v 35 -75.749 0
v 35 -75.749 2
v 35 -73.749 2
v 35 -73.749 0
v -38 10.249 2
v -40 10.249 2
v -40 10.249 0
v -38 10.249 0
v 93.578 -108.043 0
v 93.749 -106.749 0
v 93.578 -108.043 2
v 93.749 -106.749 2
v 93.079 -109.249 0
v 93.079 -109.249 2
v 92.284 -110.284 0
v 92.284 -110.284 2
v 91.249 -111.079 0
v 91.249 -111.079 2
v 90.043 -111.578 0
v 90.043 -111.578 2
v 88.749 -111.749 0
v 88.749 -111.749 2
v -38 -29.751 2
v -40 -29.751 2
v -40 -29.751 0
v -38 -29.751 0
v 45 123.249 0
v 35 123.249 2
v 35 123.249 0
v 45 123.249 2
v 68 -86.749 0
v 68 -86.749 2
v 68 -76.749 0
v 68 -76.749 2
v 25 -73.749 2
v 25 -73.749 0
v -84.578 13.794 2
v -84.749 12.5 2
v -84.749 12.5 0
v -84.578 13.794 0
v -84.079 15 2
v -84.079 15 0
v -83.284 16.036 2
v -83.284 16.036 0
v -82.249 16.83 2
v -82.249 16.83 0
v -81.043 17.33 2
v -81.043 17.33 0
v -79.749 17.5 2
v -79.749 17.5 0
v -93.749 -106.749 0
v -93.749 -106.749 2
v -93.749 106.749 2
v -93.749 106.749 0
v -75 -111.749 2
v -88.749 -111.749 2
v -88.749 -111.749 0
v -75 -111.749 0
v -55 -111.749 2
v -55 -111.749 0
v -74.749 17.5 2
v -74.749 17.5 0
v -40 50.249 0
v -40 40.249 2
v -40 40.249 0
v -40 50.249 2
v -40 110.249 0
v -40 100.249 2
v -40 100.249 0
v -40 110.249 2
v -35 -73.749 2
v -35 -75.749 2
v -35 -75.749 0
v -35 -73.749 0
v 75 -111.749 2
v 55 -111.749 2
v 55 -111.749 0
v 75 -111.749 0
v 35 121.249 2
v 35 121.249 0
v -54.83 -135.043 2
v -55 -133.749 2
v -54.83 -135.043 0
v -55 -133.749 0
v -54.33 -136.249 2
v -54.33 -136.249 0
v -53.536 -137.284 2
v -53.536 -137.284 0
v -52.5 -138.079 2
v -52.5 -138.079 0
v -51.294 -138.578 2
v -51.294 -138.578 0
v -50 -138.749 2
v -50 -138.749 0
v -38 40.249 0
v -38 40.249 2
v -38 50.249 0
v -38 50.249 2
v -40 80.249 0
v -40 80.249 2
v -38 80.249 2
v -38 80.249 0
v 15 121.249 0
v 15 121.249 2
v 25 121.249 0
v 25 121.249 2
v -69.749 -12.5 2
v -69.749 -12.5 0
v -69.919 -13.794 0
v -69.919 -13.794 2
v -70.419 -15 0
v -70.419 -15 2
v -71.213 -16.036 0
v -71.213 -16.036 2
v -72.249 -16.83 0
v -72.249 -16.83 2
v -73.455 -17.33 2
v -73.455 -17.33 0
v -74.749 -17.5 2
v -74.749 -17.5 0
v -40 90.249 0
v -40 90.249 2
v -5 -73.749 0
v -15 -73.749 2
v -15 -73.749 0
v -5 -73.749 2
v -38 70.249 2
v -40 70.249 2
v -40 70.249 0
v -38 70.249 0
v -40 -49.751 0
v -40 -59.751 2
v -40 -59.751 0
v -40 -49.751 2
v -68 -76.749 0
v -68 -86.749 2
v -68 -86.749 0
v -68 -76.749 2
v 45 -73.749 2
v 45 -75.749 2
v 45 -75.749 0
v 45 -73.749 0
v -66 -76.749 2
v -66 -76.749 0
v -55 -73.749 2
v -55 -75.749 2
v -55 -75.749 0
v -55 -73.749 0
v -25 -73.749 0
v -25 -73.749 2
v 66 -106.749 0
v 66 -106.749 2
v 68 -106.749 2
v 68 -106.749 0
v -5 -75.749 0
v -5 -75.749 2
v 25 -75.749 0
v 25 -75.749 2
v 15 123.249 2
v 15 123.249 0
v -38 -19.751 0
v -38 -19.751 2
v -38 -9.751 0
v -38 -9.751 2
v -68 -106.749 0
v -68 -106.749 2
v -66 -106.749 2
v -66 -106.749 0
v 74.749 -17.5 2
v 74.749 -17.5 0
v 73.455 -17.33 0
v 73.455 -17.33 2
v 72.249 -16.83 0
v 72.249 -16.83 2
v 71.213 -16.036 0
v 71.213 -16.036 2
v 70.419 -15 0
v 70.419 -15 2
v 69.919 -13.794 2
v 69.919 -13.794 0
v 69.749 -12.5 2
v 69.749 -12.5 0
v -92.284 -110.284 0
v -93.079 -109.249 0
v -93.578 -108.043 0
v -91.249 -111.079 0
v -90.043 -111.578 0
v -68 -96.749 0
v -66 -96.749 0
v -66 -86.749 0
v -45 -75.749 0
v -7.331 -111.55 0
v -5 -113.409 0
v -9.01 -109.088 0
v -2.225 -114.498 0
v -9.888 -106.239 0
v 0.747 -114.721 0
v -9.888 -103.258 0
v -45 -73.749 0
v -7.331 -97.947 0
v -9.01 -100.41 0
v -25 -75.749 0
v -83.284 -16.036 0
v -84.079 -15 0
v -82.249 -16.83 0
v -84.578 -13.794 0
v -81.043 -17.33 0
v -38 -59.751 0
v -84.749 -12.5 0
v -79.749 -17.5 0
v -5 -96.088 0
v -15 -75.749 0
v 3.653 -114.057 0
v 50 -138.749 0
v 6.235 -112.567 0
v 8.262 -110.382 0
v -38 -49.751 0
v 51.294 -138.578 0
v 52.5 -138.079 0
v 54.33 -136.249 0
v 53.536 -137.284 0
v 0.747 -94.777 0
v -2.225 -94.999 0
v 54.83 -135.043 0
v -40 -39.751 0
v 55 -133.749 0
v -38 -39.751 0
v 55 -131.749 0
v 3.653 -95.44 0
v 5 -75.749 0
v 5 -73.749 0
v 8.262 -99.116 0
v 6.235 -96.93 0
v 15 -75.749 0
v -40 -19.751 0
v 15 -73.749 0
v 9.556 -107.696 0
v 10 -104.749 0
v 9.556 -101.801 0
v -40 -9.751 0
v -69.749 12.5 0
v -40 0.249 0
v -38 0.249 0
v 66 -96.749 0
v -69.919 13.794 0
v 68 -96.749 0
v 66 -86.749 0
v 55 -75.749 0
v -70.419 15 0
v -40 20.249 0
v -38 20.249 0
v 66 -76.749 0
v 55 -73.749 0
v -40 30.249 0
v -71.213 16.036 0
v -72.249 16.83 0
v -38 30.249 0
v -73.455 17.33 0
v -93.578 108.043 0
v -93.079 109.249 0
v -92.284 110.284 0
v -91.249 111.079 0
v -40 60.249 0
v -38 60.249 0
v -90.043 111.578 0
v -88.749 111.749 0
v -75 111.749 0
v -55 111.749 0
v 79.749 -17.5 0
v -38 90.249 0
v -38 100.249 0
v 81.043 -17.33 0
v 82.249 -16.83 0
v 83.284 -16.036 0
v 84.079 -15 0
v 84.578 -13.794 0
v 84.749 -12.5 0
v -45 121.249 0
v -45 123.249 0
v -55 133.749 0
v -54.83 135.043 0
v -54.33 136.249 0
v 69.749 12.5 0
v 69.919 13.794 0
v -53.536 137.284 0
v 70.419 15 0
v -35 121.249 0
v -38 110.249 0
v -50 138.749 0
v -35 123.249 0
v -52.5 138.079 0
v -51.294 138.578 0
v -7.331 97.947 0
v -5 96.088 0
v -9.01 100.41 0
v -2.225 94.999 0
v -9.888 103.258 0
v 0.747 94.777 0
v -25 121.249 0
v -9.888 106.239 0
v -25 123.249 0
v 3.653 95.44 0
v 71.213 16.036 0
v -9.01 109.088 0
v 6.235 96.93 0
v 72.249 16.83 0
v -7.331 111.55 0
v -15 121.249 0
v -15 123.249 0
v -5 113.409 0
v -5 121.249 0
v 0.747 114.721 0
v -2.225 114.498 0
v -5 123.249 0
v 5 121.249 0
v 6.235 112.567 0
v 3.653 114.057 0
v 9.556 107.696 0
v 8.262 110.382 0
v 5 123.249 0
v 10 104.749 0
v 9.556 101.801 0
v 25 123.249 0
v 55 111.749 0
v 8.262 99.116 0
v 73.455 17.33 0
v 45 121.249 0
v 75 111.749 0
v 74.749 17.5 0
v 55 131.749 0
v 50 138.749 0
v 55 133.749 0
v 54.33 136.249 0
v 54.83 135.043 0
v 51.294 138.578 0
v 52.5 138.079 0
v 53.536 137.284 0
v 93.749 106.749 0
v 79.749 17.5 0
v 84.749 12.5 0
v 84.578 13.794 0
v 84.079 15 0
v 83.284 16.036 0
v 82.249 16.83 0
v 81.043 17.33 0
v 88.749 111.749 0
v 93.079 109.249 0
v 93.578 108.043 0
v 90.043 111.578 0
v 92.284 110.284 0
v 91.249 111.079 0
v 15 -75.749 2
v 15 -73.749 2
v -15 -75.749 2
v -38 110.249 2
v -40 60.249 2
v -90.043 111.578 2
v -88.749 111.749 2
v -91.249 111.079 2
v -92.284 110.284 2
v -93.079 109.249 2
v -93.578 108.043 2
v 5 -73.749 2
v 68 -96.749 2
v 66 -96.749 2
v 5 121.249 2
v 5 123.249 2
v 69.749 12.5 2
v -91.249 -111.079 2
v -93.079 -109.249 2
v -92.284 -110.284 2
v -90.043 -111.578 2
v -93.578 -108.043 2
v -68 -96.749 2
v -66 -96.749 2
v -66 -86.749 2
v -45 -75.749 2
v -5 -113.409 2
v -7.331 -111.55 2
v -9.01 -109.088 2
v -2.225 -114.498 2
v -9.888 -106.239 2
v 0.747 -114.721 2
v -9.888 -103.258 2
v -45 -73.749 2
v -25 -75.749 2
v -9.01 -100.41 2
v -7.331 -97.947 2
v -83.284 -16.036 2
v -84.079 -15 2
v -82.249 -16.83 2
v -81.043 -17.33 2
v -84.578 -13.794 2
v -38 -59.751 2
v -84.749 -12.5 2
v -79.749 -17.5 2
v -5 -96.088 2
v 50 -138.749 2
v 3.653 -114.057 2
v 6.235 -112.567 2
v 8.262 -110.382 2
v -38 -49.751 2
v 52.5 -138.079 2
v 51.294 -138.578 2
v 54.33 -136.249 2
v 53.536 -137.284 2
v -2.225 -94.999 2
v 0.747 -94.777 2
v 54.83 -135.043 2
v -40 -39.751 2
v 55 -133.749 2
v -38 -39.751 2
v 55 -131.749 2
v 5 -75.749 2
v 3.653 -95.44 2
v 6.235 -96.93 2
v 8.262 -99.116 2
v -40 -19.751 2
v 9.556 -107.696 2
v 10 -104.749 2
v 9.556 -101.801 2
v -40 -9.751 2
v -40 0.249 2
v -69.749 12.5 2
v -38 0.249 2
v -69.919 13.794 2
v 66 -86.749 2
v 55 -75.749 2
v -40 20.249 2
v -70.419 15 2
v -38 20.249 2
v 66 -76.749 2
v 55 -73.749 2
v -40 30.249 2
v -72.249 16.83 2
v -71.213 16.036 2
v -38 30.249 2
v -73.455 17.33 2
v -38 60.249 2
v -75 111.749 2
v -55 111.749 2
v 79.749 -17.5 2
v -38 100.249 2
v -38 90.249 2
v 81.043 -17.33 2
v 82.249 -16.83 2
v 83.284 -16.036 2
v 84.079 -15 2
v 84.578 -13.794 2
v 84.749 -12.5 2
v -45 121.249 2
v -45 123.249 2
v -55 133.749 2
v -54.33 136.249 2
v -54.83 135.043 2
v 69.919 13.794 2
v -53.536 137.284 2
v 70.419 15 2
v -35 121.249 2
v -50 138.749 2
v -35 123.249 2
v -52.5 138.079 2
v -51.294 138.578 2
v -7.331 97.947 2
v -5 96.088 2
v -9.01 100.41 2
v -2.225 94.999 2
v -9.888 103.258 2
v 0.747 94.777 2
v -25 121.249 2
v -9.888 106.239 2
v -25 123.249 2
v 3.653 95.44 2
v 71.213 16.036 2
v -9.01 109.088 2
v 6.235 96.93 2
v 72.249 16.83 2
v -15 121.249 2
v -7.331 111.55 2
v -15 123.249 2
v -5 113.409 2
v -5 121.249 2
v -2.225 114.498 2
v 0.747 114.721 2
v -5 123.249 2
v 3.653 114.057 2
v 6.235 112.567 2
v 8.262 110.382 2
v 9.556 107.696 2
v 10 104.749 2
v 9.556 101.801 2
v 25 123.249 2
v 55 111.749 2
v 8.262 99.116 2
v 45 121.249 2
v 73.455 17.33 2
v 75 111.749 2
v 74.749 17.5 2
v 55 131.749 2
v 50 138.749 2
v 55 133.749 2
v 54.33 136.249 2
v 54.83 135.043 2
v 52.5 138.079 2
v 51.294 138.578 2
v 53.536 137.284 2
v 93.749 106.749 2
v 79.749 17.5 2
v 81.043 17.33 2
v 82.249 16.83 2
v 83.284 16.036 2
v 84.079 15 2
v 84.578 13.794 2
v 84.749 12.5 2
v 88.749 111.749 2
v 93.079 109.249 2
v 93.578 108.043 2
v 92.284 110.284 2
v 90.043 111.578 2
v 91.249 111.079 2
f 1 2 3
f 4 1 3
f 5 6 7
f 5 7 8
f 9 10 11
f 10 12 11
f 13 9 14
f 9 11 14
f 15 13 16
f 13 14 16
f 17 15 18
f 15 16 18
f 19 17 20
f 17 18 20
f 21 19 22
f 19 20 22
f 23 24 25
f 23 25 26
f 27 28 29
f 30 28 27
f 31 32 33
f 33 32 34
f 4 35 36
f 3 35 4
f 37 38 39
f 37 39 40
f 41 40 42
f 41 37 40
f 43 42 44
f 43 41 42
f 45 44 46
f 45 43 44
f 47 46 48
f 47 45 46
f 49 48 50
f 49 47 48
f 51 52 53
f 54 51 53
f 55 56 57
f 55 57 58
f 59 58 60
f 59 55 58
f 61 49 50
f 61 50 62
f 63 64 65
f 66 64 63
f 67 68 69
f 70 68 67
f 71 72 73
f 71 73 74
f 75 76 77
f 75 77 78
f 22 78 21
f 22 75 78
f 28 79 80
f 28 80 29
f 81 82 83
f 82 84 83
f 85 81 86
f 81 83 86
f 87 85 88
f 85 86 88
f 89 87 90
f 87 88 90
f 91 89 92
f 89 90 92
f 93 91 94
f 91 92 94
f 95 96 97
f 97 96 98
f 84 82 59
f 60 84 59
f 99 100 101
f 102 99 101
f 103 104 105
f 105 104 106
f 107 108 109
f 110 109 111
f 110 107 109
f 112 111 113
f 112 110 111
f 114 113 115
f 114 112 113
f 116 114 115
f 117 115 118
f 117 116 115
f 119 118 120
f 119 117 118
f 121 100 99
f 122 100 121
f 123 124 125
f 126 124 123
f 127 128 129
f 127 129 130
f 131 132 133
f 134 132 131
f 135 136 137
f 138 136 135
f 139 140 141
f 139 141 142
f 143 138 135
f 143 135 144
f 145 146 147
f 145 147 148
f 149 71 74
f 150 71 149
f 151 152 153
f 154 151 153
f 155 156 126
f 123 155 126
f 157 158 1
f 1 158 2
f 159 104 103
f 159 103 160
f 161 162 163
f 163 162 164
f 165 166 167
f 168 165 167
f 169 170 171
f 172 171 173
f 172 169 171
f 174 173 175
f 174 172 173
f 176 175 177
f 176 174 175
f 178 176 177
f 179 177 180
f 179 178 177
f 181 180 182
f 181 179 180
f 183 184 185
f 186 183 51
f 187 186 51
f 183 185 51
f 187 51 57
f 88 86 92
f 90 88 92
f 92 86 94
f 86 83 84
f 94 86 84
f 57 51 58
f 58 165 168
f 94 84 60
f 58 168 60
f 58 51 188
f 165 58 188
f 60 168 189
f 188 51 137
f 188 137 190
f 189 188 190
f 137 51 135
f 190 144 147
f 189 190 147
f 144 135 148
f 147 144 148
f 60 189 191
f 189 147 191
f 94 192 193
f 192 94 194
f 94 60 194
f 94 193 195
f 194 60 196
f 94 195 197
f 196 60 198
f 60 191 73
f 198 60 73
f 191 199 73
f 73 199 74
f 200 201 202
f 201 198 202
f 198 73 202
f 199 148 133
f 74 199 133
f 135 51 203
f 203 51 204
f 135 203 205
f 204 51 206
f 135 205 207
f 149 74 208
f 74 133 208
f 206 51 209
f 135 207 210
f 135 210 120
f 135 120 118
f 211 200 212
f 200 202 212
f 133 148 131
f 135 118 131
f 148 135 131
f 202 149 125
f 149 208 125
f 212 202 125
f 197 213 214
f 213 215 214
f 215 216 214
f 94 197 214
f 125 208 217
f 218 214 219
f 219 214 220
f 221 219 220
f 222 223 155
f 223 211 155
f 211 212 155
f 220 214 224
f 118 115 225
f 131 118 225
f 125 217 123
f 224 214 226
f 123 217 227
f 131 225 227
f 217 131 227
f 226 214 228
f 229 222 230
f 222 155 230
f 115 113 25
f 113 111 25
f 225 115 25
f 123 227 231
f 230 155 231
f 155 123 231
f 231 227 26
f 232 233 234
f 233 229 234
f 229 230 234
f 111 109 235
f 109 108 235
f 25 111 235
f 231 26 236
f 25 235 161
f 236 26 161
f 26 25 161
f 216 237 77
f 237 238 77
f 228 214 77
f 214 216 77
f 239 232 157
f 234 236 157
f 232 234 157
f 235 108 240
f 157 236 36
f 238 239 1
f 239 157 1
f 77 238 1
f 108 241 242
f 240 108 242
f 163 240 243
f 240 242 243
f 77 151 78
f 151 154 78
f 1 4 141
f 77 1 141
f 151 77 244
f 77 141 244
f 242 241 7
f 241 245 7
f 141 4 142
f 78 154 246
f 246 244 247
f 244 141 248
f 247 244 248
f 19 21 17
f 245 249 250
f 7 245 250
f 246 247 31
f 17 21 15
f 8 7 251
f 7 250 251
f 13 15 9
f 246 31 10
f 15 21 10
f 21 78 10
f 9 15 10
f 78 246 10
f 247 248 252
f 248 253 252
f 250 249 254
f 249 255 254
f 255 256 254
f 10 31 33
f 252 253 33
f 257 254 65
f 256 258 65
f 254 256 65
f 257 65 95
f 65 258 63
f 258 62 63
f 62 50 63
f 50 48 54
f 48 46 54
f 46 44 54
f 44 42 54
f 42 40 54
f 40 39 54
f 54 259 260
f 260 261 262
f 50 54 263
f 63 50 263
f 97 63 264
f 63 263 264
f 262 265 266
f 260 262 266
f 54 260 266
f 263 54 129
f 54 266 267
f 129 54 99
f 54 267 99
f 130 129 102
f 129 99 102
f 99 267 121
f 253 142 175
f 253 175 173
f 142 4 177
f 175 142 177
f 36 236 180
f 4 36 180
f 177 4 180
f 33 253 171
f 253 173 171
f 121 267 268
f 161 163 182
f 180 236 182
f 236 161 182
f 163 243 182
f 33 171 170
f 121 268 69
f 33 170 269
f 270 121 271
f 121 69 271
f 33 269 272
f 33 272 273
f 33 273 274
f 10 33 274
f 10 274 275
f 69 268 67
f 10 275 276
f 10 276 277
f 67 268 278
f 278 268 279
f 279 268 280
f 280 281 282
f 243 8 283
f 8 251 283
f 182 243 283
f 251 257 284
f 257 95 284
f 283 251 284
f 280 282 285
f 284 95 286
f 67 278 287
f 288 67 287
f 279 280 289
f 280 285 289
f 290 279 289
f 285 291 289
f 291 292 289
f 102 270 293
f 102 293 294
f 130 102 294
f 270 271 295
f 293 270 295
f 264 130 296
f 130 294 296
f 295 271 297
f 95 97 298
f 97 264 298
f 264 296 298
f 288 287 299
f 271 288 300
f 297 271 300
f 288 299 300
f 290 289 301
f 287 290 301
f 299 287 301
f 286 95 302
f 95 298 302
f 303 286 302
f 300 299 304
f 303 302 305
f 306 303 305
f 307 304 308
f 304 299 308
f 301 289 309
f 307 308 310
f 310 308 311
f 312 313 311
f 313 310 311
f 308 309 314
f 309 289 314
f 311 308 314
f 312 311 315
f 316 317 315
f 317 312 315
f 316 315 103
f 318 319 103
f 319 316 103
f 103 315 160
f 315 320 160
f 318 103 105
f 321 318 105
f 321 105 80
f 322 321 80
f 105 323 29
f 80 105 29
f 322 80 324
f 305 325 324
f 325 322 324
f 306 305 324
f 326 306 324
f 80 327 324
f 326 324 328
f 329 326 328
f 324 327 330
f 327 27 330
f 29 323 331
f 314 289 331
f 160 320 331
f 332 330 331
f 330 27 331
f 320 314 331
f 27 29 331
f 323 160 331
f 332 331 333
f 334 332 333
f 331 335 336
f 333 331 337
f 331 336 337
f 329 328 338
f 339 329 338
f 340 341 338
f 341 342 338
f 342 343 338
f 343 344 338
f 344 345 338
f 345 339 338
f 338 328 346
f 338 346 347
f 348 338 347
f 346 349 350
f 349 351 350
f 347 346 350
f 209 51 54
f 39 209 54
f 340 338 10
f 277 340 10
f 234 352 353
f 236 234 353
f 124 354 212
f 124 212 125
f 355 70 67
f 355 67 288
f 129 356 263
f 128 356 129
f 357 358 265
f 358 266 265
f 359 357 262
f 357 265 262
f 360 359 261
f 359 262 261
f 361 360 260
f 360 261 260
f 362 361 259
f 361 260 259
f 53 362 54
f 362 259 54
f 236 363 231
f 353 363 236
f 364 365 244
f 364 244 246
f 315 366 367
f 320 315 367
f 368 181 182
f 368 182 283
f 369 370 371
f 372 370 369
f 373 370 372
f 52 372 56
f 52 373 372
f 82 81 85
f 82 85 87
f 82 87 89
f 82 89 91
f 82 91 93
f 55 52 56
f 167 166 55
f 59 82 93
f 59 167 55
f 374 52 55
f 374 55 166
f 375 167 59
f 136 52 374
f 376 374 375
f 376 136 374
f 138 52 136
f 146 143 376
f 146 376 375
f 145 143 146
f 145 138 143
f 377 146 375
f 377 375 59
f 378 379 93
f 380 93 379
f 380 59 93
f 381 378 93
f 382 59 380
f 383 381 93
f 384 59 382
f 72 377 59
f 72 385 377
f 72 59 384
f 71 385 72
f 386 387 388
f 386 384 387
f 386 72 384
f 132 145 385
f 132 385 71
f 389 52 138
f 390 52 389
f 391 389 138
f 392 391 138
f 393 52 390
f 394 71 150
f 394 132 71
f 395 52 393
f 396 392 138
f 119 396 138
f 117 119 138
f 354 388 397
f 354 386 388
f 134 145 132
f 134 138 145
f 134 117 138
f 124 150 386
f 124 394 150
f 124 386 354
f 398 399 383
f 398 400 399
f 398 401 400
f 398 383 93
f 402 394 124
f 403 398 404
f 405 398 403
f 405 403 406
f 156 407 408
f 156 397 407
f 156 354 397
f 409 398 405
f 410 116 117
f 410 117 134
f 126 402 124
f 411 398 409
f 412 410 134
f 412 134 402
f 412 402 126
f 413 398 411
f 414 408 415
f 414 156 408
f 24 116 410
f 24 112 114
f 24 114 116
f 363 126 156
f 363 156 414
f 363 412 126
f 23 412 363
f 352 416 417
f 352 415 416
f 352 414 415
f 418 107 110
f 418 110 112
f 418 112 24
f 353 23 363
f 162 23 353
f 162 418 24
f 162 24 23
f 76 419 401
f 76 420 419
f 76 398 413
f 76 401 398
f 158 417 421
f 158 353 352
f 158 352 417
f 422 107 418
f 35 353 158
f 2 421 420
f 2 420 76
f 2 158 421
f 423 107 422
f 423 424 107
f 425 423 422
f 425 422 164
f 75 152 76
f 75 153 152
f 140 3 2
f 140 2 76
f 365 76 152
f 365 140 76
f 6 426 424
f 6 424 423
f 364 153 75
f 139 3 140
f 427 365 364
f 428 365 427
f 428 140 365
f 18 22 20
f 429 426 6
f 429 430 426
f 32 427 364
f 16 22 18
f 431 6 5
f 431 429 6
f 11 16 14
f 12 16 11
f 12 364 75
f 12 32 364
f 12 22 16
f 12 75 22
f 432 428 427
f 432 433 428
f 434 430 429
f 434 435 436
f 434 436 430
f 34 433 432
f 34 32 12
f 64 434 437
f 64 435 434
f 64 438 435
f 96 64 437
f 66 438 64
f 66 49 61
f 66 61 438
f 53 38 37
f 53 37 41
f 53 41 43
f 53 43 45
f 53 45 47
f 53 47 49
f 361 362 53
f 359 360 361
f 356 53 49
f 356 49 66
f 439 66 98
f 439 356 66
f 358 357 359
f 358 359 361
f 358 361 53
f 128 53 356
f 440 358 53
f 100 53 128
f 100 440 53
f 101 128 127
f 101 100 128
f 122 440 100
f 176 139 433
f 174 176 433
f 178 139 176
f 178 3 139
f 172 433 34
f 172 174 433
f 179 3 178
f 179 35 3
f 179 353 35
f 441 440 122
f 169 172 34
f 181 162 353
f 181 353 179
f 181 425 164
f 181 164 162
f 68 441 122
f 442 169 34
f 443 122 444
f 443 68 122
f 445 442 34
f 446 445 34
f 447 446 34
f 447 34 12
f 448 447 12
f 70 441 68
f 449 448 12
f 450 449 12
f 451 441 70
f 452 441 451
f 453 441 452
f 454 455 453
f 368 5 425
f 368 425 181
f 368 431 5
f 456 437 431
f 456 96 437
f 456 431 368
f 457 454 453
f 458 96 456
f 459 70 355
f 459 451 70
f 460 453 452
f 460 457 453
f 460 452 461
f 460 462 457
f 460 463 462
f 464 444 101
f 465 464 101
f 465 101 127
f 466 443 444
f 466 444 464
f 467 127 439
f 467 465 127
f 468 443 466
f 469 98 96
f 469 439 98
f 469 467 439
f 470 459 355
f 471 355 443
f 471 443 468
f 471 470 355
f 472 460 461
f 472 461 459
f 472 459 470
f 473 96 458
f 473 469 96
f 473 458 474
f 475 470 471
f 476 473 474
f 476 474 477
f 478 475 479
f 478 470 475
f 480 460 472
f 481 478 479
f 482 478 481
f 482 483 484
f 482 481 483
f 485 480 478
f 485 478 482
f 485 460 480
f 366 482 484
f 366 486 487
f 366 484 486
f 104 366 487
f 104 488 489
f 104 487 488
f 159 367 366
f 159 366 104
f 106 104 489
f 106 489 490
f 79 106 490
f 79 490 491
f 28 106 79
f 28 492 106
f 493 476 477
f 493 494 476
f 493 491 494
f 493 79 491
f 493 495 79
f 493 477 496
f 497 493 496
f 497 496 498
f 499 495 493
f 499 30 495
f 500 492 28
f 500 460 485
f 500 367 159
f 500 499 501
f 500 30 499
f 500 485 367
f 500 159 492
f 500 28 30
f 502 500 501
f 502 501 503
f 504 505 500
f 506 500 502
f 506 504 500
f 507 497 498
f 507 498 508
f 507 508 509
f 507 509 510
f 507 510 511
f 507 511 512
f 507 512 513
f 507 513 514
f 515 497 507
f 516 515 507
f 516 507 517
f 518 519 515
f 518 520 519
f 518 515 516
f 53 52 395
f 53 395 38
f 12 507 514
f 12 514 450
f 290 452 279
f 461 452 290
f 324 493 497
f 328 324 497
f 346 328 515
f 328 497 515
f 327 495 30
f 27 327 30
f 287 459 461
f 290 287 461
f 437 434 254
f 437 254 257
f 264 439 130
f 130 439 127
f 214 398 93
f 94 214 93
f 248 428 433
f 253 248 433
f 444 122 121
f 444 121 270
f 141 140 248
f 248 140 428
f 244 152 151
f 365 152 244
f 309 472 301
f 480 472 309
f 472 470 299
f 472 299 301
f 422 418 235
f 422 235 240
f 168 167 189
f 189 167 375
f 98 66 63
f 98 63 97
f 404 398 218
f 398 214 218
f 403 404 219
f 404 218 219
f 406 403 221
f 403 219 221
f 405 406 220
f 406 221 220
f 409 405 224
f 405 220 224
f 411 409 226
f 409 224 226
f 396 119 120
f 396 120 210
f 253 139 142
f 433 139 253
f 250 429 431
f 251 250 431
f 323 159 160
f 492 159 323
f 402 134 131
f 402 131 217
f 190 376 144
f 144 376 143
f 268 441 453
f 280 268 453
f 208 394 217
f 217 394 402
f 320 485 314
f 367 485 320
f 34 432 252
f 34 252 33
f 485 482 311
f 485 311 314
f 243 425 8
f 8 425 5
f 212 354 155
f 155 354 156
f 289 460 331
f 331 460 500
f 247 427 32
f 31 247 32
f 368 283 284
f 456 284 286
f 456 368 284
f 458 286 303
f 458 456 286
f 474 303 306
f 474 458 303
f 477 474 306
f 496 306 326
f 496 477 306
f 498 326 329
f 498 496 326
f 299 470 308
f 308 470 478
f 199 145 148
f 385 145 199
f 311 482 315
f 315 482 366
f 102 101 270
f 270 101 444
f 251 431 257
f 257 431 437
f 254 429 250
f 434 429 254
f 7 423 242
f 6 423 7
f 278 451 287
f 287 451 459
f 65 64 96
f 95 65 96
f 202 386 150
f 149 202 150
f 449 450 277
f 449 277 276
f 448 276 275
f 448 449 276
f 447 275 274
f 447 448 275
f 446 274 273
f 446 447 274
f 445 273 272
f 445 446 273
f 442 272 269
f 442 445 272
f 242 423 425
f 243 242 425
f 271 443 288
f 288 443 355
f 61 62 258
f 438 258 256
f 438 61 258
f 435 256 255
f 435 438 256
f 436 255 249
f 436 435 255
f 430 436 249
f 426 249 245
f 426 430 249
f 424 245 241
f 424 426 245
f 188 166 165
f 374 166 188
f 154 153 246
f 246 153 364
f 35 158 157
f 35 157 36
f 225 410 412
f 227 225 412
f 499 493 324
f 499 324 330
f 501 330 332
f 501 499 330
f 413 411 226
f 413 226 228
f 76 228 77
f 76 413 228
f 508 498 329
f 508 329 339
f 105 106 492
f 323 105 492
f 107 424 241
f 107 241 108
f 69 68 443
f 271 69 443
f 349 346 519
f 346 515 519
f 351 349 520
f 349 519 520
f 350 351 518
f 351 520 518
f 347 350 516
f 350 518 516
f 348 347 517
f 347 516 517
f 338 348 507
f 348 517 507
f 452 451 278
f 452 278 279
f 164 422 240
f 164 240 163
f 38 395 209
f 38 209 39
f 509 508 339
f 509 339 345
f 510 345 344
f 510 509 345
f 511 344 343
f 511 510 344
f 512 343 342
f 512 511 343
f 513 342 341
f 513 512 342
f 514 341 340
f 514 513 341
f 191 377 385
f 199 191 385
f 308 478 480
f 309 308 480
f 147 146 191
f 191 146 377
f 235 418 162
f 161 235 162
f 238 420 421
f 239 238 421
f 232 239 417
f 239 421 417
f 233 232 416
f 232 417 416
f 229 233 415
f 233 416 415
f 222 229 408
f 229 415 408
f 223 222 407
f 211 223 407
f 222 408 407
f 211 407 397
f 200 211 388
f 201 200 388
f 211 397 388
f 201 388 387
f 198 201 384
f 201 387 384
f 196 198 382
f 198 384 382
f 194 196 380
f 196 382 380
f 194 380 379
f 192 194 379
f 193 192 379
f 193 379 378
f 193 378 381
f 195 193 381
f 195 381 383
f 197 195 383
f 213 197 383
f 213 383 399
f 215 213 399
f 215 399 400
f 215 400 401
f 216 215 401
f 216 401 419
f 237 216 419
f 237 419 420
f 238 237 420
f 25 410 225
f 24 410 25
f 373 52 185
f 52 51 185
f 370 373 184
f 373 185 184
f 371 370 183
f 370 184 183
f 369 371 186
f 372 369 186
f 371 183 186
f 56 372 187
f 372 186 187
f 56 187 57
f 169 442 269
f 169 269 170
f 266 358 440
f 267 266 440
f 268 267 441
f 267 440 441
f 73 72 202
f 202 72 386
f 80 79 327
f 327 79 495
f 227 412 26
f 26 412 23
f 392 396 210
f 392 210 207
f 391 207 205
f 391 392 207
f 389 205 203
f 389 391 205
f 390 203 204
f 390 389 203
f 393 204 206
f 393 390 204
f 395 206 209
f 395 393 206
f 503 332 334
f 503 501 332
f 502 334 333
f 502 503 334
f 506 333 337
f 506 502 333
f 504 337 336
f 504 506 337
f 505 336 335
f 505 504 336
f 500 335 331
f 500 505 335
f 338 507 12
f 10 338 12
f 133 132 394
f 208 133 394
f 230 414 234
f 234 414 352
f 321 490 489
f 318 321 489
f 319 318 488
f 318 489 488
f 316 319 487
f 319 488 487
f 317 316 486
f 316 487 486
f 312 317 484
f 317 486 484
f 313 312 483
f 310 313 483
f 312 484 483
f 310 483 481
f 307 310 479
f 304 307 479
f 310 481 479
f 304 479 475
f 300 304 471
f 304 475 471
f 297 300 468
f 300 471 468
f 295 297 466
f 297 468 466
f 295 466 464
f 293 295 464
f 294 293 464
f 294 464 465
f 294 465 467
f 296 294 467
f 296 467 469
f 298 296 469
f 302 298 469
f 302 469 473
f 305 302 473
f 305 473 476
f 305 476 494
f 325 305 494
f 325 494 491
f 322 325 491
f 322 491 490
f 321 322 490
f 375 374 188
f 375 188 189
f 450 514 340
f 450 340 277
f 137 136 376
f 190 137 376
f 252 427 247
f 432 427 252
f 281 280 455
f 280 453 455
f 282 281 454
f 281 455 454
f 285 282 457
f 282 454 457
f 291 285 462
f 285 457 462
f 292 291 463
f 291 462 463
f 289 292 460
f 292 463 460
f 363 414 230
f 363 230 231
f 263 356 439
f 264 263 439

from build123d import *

# Parameters (mm, degrees)
BASE_DEPTH                   = 2
ESQUISSE2_W                  = 20
ESQUISSE2_H                  = 20
PER_AGE_PROFIL_DEPTH         = 5
ESQUISSE3_R                  = 10
TROUS_C_BLE_BREADBOARD_DEPTH = 5
SKETCH2_W                    = 10
SKETCH2_H                    = 3
SKETCH2_W_2                  = 3
SKETCH2_H_2                  = 10
CUT_EXTRUDE1_DEPTH           = 3
ENL_V_MAT_EXTRU_1_DEPTH      = 3
ESQUISSE6_W                  = 67.618725508
ESQUISSE6_H                  = 41.085883865
ESQUISSE6_W_2                = 53.230557381
ESQUISSE6_H_2                = 34.991468873
ESQUISSE6_W_3                = 73.131534877
ESQUISSE6_H_3                = 36.535913055
ESQUISSE6_W_4                = 49.288624516
ESQUISSE6_H_4                = 35.233839469
ENL_V_MAT_EXTRU_2_DEPTH      = 3
CONG_2_R                     = 5
ESQUISSE7_W                  = 1
ESQUISSE7_H                  = 170
ESQUISSE7_H_2                = 30
ESQUISSE7_W_2                = 90
ESQUISSE7_H_3                = 1
ESQUISSE7_W_3                = 110
BOSS_EXTRU_1_DEPTH           = 2
CONG_3_R                     = 5


with BuildPart() as part:
    # Esquisse1 → Base (new body)
    with BuildSketch(Plane.XY):
        Polygon((-99.748737342, 120), (-75, 144.748737342), (75, 144.748737342), (99.748737342, 120), (99.748737342, -120), (75, -144.748737342), (-75, -144.748737342), (-99.748737342, -120), align=None)
    extrude(amount=BASE_DEPTH)

    # Esquisse2 → Perçage profilé (cut)
    with BuildSketch(Plane.XY.offset(2)):
        with Locations((65, 121.748737342)):
            Rectangle(ESQUISSE2_W, ESQUISSE2_H)
        with Locations((-65, 121.748737342)):
            Rectangle(ESQUISSE2_W, ESQUISSE2_H)
        with Locations((65, -121.748737342)):
            Rectangle(ESQUISSE2_W, ESQUISSE2_H)
        with Locations((-65, -121.748737342)):
            Rectangle(ESQUISSE2_W, ESQUISSE2_H)
    extrude(amount=-PER_AGE_PROFIL_DEPTH, mode=Mode.SUBTRACT)

    # Esquisse3 → Trous câble breadboard (cut)
    with BuildSketch(Plane.XY.offset(2)):
        with Locations((0, -104.748737342)):
            Circle(ESQUISSE3_R)
        with Locations((0, 104.748737342)):
            Circle(ESQUISSE3_R)
        with BuildLine():
            Line((79.748737342, -17.5), (74.748737342, -17.5))
            ThreePointArc((74.748737342, -17.5), (71.213203436, -16.035533906), (69.748737342, -12.5))
            Line((69.748737342, -12.5), (69.748737342, 12.5))
            ThreePointArc((69.748737342, 12.5), (71.213203436, 16.035533906), (74.748737342, 17.5))
            Line((74.748737342, 17.5), (79.748737342, 17.5))
            ThreePointArc((79.748737342, 17.5), (83.284271247, 16.035533906), (84.748737342, 12.5))
            Line((84.748737342, 12.5), (84.748737342, -12.5))
            ThreePointArc((84.748737342, -12.5), (83.284271247, -16.035533906), (79.748737342, -17.5))
        make_face()
        with BuildLine():
            Line((-79.748737342, 17.5), (-74.748737342, 17.5))
            ThreePointArc((-74.748737342, 17.5), (-71.213203436, 16.035533906), (-69.748737342, 12.5))
            Line((-69.748737342, 12.5), (-69.748737342, -12.5))
            ThreePointArc((-69.748737342, -12.5), (-71.213203436, -16.035533906), (-74.748737342, -17.5))
            Line((-74.748737342, -17.5), (-79.748737342, -17.5))
            ThreePointArc((-79.748737342, -17.5), (-83.284271247, -16.035533906), (-84.748737342, -12.5))
            Line((-84.748737342, -12.5), (-84.748737342, 12.5))
            ThreePointArc((-84.748737342, 12.5), (-83.284271247, 16.035533906), (-79.748737342, 17.5))
        make_face()
    extrude(amount=-TROUS_C_BLE_BREADBOARD_DEPTH, mode=Mode.SUBTRACT)

    # Sketch2 → Cut-Extrude1 (cut, through all)
    with BuildSketch(Plane.XY.offset(2)):
        with Locations((-40, 121.748737342)):
            Rectangle(SKETCH2_W, SKETCH2_H)
        with Locations((-20, 121.748737342)):
            Rectangle(SKETCH2_W, SKETCH2_H)
        with Locations((0, 121.748737342)):
            Rectangle(SKETCH2_W, SKETCH2_H)
        with Locations((20, 121.748737342)):
            Rectangle(SKETCH2_W, SKETCH2_H)
        with Locations((40, 121.748737342)):
            Rectangle(SKETCH2_W, SKETCH2_H)
        with Locations((-66.5, -101.748737342)):
            Rectangle(SKETCH2_W_2, SKETCH2_H_2)
        with Locations((-38.5, 85.248737342)):
            Rectangle(SKETCH2_W_2, SKETCH2_H_2)
        with Locations((-38.5, 105.248737342)):
            Rectangle(SKETCH2_W_2, SKETCH2_H_2)
        with Locations((-66.5, -81.748737342)):
            Rectangle(SKETCH2_W_2, SKETCH2_H_2)
        with Locations((66.5, -81.748737342)):
            Rectangle(SKETCH2_W_2, SKETCH2_H_2)
        with Locations((66.5, -101.748737342)):
            Rectangle(SKETCH2_W_2, SKETCH2_H_2)
        with Locations((-30, -75.248737342)):
            Rectangle(SKETCH2_W, SKETCH2_H)
        with Locations((-50, -75.248737342)):
            Rectangle(SKETCH2_W, SKETCH2_H)
        with Locations((-10, -75.248737342)):
            Rectangle(SKETCH2_W, SKETCH2_H)
        with Locations((10, -75.248737342)):
            Rectangle(SKETCH2_W, SKETCH2_H)
        with Locations((30, -75.248737342)):
            Rectangle(SKETCH2_W, SKETCH2_H)
        with Locations((50, -75.248737342)):
            Rectangle(SKETCH2_W, SKETCH2_H)
        with Locations((-38.5, 65.248737342)):
            Rectangle(SKETCH2_W_2, SKETCH2_H_2)
        with Locations((-38.5, 45.248737342)):
            Rectangle(SKETCH2_W_2, SKETCH2_H_2)
        with Locations((-38.5, 25.248737342)):
            Rectangle(SKETCH2_W_2, SKETCH2_H_2)
        with Locations((-38.5, 5.248737342)):
            Rectangle(SKETCH2_W_2, SKETCH2_H_2)
        with Locations((-38.5, -14.751262658)):
            Rectangle(SKETCH2_W_2, SKETCH2_H_2)
        with Locations((-38.5, -34.751262658)):
            Rectangle(SKETCH2_W_2, SKETCH2_H_2)
        with Locations((-38.5, -54.751262658)):
            Rectangle(SKETCH2_W_2, SKETCH2_H_2)
    extrude(amount=-CUT_EXTRUDE1_DEPTH, mode=Mode.SUBTRACT)

    # Esquisse5 → Enlèv. mat.-Extru.1 (cut, through all)
    with BuildSketch(Plane.XY.offset(2)):
        Polygon((-16.674289333, 205.045094985), (192.81948305, 199.325128504), (168.509625504, -212.512458161), (-168.968396902, -176.762667652), (-185.413300536, 175.015270958), align=None)
        Polygon((-72.514718626, 138.748737342), (72.514718626, 138.748737342), (93.748737342, 117.514718626), (93.748737342, -117.514718626), (72.514718626, -138.748737342), (-72.514718626, -138.748737342), (-93.748737342, -117.514718626), (-93.748737342, 117.514718626), align=None, mode=Mode.SUBTRACT)
    extrude(amount=-ENL_V_MAT_EXTRU_1_DEPTH, mode=Mode.SUBTRACT)

    # Esquisse6 → Enlèv. mat.-Extru.2 (cut, through all)
    with BuildSketch(Plane.XY.offset(2)):
        with Locations((-88.809362754, 132.291679275)):
            Rectangle(ESQUISSE6_W, ESQUISSE6_H)
        with Locations((81.615278691, 129.244471779)):
            Rectangle(ESQUISSE6_W_2, ESQUISSE6_H_2)
        with Locations((91.565767439, -130.01669387)):
            Rectangle(ESQUISSE6_W_3, ESQUISSE6_H_3)
        with Locations((-79.644312258, -129.365657077)):
            Rectangle(ESQUISSE6_W_4, ESQUISSE6_H_4)
    extrude(amount=-ENL_V_MAT_EXTRU_2_DEPTH, mode=Mode.SUBTRACT)

    # Congé2
    cong_2_edges = [part.edges().sort_by_distance(p)[0] for p in [
        (55, -138.748737342, 1),
        (-55, -138.748737342, 1),
        (-55, 138.748737342, 1),
        (55, 138.748737342, 1),
    ]]
    fillet(cong_2_edges, radius=CONG_2_R)

    # Esquisse7 → Boss.-Extru.1 (add)
    with BuildSketch(Plane.XY.offset(2)):
        with Locations((-37.5, 25.248737342)):
            Rectangle(ESQUISSE7_W, ESQUISSE7_H)
        with Locations((-65.5, -91.748737342)):
            Rectangle(ESQUISSE7_W, ESQUISSE7_H_2)
        with Locations((65.5, -91.748737342)):
            Rectangle(ESQUISSE7_W, ESQUISSE7_H_2)
        with Locations((0, 120.748737342)):
            Rectangle(ESQUISSE7_W_2, ESQUISSE7_H_3)
        with Locations((0, -76.248737342)):
            Rectangle(ESQUISSE7_W_3, ESQUISSE7_H_3)
    extrude(amount=-BOSS_EXTRU_1_DEPTH)

    # Congé3
    cong_3_edges = [part.edges().sort_by_distance(p)[0] for p in [
        (-93.748737342, 111.748737342, 1),
        (-93.748737342, -111.748737342, 1),
        (93.748737342, 111.748737342, 1),
        (93.748737342, -111.748737342, 1),
    ]]
    fillet(cong_3_edges, radius=CONG_3_R)


solid = part.part
